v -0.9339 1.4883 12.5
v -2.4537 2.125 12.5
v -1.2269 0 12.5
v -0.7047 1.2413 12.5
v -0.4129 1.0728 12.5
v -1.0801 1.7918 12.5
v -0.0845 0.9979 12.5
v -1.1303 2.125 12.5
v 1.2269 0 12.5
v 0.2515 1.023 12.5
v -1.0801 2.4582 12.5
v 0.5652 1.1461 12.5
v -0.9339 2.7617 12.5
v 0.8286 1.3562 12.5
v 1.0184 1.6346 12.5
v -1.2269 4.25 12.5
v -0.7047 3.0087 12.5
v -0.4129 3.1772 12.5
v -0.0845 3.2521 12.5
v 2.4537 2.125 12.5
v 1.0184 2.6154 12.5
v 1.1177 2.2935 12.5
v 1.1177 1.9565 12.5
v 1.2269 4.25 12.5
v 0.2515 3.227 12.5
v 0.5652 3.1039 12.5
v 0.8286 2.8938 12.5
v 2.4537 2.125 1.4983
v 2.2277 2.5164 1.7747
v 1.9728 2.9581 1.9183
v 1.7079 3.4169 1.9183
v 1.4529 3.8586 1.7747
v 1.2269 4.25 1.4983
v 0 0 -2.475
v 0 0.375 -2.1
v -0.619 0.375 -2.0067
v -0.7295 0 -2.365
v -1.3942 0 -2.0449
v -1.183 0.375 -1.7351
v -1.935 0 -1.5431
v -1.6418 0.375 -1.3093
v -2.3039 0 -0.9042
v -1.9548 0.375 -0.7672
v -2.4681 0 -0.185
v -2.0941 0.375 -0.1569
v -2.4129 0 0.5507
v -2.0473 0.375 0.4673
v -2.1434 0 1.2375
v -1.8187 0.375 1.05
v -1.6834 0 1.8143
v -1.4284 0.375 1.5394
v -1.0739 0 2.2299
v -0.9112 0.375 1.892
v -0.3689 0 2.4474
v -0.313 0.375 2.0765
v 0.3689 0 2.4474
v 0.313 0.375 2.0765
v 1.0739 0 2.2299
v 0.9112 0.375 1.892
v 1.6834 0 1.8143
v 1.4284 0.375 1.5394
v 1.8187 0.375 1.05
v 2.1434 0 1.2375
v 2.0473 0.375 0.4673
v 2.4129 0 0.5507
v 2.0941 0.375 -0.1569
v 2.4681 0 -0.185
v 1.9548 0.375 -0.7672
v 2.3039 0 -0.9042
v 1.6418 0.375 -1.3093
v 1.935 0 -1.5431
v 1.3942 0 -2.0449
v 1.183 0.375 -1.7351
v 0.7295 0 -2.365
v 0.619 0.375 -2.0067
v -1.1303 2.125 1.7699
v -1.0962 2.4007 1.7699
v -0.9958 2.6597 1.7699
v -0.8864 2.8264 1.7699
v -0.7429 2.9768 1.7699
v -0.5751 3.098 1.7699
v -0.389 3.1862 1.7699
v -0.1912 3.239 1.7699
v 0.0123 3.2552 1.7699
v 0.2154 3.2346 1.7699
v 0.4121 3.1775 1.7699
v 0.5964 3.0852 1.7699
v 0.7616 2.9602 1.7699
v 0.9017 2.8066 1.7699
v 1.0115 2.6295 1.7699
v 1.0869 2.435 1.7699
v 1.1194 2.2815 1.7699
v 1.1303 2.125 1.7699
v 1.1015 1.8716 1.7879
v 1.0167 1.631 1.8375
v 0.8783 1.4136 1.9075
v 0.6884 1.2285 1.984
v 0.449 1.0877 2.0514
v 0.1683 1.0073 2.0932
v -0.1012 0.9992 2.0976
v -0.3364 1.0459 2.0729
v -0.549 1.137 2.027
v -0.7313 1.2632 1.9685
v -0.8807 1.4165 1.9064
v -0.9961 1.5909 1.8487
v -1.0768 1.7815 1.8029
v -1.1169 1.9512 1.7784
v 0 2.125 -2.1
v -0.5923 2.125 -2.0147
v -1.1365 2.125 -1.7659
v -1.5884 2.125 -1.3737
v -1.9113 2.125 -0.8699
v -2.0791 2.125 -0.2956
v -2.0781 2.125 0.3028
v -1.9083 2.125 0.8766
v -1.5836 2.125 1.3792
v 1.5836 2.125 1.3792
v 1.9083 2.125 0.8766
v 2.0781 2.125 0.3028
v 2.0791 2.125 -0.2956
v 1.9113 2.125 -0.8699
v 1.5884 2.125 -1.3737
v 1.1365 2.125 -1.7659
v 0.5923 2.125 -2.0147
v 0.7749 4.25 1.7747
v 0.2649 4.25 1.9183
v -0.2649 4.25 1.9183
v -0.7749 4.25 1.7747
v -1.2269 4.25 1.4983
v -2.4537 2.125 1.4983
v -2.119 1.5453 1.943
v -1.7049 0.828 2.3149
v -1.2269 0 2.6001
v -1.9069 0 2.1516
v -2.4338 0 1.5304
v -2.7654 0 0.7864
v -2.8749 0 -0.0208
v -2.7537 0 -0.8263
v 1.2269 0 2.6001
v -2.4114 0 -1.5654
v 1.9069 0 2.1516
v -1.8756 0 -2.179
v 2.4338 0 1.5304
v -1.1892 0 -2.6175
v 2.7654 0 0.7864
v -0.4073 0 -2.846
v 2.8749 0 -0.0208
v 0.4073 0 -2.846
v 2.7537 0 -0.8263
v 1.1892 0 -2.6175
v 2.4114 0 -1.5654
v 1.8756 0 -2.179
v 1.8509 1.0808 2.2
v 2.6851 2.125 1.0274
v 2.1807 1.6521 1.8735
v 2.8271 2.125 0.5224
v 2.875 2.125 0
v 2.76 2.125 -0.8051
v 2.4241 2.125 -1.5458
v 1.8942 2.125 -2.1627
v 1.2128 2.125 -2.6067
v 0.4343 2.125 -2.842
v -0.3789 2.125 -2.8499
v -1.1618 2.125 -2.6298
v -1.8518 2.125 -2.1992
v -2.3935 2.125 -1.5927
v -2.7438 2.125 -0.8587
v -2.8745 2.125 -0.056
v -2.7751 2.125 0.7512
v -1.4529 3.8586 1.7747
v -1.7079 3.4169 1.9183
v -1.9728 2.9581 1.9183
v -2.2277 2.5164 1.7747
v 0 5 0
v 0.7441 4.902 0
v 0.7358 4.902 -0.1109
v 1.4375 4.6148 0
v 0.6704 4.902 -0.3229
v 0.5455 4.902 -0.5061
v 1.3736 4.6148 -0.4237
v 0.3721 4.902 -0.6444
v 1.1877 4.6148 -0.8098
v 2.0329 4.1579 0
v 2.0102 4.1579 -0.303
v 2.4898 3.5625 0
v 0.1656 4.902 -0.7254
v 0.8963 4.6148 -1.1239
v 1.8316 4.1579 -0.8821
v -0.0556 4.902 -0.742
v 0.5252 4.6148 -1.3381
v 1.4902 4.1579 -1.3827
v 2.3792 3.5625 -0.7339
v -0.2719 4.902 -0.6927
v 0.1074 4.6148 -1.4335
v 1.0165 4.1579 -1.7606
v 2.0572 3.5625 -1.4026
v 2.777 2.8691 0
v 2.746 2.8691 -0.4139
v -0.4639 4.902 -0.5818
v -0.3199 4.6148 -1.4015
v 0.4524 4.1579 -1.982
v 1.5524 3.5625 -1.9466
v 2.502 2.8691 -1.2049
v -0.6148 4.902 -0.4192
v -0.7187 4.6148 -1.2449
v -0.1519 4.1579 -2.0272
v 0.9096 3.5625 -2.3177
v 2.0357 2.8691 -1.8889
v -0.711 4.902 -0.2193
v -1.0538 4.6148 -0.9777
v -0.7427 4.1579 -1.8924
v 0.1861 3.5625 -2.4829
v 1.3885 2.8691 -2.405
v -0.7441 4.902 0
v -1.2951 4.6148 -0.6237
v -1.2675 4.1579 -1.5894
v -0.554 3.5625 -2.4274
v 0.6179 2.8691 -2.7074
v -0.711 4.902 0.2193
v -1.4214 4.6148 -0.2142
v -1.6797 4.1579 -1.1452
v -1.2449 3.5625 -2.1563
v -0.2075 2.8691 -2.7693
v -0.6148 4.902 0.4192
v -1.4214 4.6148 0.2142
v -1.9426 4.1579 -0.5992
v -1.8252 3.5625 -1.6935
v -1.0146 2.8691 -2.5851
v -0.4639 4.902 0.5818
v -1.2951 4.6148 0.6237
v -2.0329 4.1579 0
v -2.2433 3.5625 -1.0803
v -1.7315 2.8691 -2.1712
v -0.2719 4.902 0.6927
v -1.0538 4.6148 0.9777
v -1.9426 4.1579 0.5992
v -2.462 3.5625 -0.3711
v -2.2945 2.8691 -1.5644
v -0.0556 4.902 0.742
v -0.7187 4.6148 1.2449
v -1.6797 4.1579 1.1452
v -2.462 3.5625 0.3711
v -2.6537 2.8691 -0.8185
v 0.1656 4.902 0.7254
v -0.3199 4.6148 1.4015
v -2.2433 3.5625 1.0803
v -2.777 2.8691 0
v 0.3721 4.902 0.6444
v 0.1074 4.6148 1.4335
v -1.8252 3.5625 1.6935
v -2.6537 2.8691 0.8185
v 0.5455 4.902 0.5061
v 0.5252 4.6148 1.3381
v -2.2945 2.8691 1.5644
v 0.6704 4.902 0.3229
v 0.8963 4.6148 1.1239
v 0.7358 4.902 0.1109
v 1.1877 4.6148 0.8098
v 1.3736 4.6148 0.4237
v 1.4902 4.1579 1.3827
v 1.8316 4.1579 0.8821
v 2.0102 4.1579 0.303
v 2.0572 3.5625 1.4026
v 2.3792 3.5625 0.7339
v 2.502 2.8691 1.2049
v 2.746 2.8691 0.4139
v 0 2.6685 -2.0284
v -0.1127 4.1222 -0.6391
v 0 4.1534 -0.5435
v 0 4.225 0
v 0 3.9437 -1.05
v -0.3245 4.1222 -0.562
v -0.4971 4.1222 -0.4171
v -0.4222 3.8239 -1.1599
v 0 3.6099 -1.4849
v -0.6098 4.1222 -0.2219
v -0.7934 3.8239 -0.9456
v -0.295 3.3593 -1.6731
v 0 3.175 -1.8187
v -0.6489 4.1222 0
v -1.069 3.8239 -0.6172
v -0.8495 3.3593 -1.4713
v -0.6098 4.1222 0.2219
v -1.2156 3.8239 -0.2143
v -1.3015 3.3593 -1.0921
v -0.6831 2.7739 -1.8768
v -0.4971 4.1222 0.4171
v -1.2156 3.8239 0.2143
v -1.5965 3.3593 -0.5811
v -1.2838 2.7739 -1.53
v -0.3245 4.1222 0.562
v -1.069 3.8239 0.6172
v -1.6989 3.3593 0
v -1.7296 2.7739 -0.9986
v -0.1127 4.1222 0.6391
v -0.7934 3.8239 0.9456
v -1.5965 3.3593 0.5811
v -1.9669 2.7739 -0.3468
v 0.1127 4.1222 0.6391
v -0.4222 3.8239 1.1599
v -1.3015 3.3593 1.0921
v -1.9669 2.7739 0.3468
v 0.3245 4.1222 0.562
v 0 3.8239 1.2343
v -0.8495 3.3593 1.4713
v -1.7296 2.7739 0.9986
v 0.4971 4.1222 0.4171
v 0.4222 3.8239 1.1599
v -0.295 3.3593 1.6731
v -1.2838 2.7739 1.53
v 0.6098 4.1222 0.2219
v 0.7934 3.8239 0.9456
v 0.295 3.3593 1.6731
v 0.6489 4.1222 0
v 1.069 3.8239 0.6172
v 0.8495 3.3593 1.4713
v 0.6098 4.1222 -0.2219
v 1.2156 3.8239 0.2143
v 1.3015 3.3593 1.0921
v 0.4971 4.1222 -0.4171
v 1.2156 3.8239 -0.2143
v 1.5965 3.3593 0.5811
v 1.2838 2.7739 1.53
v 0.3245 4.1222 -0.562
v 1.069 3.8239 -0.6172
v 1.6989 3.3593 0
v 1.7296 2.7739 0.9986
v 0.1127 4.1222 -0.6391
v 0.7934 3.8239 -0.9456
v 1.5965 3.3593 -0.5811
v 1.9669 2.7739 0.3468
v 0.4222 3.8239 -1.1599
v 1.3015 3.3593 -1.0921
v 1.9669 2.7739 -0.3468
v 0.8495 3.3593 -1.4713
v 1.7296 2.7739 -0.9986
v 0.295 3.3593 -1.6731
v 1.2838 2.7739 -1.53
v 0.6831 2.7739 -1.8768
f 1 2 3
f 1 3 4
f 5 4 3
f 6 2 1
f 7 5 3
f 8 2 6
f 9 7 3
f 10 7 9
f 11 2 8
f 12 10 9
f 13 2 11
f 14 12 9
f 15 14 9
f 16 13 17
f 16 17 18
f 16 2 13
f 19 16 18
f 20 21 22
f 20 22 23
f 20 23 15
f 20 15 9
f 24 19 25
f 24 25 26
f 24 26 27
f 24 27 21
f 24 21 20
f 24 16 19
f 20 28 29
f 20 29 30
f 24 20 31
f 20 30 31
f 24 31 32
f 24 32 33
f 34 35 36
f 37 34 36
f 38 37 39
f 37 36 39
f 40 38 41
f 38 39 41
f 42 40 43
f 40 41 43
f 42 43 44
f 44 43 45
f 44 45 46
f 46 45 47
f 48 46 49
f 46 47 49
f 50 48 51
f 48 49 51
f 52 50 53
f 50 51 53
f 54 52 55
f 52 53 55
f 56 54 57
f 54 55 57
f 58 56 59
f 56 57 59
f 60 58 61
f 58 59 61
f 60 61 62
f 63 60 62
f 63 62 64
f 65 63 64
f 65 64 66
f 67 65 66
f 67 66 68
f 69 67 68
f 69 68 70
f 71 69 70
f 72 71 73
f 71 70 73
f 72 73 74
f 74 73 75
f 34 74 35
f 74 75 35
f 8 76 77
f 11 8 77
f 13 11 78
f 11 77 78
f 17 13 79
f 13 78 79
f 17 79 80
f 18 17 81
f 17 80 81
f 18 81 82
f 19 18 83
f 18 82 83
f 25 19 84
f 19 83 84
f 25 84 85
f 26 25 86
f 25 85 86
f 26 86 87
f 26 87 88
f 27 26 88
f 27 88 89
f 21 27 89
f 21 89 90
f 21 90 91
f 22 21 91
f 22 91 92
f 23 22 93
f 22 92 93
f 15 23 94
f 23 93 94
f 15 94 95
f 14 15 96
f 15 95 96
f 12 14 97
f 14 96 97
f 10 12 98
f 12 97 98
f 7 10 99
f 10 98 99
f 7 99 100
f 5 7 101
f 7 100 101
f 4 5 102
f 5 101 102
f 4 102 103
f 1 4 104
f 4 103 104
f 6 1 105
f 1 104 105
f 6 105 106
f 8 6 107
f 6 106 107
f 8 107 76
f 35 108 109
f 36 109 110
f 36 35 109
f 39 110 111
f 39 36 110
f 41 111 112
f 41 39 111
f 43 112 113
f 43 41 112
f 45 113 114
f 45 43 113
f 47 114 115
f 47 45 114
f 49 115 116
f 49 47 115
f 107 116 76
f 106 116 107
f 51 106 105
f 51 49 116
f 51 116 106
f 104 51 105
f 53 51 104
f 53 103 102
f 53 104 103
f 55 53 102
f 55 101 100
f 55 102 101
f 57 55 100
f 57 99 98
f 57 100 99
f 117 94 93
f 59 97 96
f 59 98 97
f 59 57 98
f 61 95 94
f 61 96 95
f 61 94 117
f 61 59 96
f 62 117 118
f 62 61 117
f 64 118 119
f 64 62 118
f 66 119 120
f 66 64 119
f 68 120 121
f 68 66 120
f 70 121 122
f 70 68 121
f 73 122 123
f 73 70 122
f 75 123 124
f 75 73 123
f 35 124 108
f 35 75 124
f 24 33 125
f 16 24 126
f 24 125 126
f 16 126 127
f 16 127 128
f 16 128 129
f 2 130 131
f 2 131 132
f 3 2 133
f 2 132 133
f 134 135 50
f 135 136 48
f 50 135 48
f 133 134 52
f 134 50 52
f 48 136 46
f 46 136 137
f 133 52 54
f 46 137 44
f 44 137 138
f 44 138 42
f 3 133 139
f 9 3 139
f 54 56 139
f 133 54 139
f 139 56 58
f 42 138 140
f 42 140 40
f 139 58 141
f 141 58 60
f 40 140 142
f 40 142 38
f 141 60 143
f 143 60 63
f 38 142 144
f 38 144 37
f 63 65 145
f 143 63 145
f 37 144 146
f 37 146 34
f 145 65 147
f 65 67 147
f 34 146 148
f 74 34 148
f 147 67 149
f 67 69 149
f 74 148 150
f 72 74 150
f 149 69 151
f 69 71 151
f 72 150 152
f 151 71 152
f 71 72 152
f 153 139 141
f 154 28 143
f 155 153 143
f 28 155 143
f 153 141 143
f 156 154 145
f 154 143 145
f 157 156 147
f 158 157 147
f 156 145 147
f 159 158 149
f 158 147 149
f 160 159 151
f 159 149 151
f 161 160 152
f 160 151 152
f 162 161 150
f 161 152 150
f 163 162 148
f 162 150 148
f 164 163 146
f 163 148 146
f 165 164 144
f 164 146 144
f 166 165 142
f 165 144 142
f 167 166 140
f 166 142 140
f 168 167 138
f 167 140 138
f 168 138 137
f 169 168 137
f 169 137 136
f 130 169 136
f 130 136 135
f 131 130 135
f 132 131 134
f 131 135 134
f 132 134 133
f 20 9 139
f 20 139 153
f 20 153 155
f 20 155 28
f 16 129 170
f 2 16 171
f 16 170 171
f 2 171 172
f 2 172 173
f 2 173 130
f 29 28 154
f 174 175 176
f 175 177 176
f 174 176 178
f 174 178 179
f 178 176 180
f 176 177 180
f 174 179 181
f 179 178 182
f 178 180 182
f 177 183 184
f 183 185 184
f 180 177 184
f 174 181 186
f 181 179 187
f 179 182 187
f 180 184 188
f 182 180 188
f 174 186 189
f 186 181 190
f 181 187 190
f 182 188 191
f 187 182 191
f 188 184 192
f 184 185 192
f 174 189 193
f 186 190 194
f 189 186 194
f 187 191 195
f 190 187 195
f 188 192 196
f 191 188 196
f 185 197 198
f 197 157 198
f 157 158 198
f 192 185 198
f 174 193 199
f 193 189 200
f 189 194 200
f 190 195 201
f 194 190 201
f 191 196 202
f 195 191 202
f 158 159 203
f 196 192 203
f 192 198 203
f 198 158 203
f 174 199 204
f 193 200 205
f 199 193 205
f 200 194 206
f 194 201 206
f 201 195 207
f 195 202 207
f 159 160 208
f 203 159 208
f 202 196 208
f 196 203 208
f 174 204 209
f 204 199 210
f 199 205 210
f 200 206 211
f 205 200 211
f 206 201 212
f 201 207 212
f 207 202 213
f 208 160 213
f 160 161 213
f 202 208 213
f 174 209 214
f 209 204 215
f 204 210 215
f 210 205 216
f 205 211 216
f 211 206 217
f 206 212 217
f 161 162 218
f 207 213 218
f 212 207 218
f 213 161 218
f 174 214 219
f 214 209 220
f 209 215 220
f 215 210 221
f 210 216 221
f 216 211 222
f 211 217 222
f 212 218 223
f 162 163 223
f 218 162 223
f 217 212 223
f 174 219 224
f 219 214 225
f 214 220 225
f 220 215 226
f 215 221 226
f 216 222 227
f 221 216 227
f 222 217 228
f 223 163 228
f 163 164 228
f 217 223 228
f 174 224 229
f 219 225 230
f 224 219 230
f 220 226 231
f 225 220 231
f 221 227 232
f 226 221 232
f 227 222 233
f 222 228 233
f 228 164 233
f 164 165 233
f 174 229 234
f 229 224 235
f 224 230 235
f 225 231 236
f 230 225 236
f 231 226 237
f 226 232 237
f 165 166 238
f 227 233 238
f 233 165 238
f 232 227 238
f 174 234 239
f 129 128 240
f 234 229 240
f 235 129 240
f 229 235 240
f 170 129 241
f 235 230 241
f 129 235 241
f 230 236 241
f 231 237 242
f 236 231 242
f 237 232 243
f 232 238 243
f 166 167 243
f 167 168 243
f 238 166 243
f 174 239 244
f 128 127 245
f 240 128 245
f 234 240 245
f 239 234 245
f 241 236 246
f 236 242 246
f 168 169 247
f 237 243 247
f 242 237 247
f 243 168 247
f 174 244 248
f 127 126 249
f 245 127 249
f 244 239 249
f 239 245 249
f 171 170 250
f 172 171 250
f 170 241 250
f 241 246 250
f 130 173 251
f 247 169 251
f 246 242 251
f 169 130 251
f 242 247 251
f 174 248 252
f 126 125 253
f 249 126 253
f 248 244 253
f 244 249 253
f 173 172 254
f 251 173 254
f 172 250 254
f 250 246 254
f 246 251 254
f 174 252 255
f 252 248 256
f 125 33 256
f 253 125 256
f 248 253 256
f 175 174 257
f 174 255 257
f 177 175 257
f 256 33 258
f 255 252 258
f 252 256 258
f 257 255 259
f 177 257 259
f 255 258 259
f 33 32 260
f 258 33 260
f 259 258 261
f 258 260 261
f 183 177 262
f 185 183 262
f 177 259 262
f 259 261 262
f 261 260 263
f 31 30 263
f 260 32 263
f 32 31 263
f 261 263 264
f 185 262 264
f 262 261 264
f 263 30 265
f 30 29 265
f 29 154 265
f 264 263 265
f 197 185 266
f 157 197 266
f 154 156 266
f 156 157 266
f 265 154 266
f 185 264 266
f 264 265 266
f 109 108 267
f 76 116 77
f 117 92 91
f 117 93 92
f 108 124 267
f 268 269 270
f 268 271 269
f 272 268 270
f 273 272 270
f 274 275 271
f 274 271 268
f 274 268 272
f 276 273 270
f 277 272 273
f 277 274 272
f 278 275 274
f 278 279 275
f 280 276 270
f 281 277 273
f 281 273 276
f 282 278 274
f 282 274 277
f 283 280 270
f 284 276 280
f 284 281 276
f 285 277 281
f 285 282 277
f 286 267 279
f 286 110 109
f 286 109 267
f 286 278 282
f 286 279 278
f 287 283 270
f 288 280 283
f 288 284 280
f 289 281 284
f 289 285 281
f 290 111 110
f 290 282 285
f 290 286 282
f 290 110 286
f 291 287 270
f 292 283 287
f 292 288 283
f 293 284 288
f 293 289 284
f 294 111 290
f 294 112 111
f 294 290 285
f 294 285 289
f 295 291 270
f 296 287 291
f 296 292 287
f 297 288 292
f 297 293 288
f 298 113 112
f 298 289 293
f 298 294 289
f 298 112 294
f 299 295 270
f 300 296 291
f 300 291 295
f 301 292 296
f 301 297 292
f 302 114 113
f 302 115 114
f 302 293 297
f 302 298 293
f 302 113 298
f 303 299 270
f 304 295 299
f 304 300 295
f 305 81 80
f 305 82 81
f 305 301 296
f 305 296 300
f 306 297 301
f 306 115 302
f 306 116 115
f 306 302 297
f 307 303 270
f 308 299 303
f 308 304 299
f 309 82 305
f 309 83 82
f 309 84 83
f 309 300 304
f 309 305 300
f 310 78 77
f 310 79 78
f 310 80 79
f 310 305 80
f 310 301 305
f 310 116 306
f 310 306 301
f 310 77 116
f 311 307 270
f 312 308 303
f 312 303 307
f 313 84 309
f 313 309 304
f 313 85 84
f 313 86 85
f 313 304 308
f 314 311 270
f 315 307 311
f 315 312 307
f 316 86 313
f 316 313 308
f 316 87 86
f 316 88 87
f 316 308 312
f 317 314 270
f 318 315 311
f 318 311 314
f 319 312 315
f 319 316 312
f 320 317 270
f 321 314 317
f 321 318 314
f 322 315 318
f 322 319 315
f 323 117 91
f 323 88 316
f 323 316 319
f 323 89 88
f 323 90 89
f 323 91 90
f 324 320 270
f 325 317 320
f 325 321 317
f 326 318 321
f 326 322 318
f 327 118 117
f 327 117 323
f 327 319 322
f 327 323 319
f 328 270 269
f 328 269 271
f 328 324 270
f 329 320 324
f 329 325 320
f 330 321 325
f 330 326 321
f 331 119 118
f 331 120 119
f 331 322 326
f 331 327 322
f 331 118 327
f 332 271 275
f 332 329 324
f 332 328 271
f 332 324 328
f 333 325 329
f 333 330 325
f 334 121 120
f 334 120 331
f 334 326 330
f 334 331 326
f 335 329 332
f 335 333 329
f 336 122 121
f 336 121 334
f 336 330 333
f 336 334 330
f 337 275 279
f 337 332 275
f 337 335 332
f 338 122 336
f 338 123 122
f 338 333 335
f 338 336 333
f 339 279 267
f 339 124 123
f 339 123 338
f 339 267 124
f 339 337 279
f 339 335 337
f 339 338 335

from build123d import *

# Parameters (mm, degrees)
BOSS_EXTRUDE1_DEPTH       = 12.5
F_4_40_TAPPED_HOLE1_D     = 2.2606
F_4_40_TAPPED_HOLE1_DEPTH = 12
F_4_40_TAPPED_HOLE1_TIP   = 0.679152758
CHAMFER1_SIZE             = 0.375


with BuildPart() as part:
    # Sketch1 → Revolve1 (revolve)
    with BuildSketch(Plane.XY):
        with BuildLine():
            Line((2.875, 2.125), (2.875, 0))
            Line((2.875, 0), (0, 0))
            Line((0, 0), (0, 5))
            ThreePointArc((0, 5), (2.032931996, 4.157931996), (2.875, 2.125))
        make_face()
    revolve(axis=Axis((0, 0, 0), (0, 1, 0)))

    # Sketch2 → Boss-Extrude1 (add)
    with BuildSketch(Plane.XY):
        Polygon((-1.226869322, 0), (1.226869322, 0), (2.453738644, 2.125), (1.226869322, 4.25), (-1.226869322, 4.25), (-2.453738644, 2.125), align=None)
    extrude(amount=BOSS_EXTRUDE1_DEPTH)

    # #4-40 Tapped Hole1
    with Locations(Plane.XY.offset(12.5)):
        with Locations((0, 2.125)):
            Hole(F_4_40_TAPPED_HOLE1_D / 2, depth=F_4_40_TAPPED_HOLE1_DEPTH)
            with Locations((0, 0, -(F_4_40_TAPPED_HOLE1_DEPTH + F_4_40_TAPPED_HOLE1_TIP / 2))):  # 118° drill point
                Cone(0, F_4_40_TAPPED_HOLE1_D / 2, F_4_40_TAPPED_HOLE1_TIP, mode=Mode.SUBTRACT)

    # Sketch5 → Cut-Revolve1 (revolve, cut)
    with BuildSketch(Plane(origin=(0, 0, 0), x_dir=(0, 0, -1), z_dir=(1, 0, 0))):
        with BuildLine():
            Line((2.1, 2.125), (2.1, 0))
            Line((2.1, 0), (0, 0))
            Line((0, 0), (0, 4.225))
            ThreePointArc((0, 4.225), (1.48492424, 3.60992424), (2.1, 2.125))
        make_face()
    revolve(axis=Axis((0, 0, 0), (0, 1, 0)), mode=Mode.SUBTRACT)

    # Chamfer1
    chamfer1_edges = [part.edges().sort_by_distance(p)[0] for p in [
        (0, 0, 2.1),
    ]]
    chamfer(chamfer1_edges, length=CHAMFER1_SIZE)


solid = part.part
